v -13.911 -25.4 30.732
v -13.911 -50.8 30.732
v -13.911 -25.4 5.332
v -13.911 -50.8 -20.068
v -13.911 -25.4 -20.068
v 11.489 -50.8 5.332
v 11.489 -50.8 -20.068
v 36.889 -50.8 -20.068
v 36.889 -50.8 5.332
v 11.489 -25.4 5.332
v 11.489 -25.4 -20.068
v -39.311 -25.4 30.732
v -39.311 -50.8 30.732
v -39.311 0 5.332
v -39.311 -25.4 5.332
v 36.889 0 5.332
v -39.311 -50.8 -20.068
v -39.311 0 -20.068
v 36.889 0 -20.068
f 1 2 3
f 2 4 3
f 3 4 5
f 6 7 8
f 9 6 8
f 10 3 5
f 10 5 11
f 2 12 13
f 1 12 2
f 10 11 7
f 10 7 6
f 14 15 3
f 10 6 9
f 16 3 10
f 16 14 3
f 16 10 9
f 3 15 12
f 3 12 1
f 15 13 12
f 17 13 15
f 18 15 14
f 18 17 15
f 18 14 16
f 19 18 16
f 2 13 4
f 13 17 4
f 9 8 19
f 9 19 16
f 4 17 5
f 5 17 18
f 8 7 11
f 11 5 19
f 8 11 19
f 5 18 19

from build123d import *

# Parameters (mm, degrees)
F0_W     = 25.4
F0_H     = 25.4
F1_DEPTH = 25.4
F2_DEPTH = 50.8
F3_W     = 25.4
F3_H     = 25.4
F4_DEPTH = 25.4


with BuildPart() as f1:
    # F0 (on Front) → F1 (new body)
    with BuildSketch(Plane.XZ):
        with Locations((-1.210593, -7.368315)):
            Rectangle(F0_W, F0_H)
    extrude(amount=F1_DEPTH)

    # F0 (on Front) → F2 (join)
    with BuildSketch(Plane.XZ):
        with Locations((-26.610593, -7.368315)):
            Rectangle(F0_W, F0_H)
        with Locations((24.189407, -7.368315)):
            Rectangle(F0_W, F0_H)
    extrude(amount=F2_DEPTH)

    # F3 (on face) → F4 (join)
    with BuildSketch(Plane.XY.offset(5.331685)):
        with Locations((-26.610593, -38.1)):
            Rectangle(F3_W, F3_H)
    extrude(amount=F4_DEPTH)


solid = f1.part
